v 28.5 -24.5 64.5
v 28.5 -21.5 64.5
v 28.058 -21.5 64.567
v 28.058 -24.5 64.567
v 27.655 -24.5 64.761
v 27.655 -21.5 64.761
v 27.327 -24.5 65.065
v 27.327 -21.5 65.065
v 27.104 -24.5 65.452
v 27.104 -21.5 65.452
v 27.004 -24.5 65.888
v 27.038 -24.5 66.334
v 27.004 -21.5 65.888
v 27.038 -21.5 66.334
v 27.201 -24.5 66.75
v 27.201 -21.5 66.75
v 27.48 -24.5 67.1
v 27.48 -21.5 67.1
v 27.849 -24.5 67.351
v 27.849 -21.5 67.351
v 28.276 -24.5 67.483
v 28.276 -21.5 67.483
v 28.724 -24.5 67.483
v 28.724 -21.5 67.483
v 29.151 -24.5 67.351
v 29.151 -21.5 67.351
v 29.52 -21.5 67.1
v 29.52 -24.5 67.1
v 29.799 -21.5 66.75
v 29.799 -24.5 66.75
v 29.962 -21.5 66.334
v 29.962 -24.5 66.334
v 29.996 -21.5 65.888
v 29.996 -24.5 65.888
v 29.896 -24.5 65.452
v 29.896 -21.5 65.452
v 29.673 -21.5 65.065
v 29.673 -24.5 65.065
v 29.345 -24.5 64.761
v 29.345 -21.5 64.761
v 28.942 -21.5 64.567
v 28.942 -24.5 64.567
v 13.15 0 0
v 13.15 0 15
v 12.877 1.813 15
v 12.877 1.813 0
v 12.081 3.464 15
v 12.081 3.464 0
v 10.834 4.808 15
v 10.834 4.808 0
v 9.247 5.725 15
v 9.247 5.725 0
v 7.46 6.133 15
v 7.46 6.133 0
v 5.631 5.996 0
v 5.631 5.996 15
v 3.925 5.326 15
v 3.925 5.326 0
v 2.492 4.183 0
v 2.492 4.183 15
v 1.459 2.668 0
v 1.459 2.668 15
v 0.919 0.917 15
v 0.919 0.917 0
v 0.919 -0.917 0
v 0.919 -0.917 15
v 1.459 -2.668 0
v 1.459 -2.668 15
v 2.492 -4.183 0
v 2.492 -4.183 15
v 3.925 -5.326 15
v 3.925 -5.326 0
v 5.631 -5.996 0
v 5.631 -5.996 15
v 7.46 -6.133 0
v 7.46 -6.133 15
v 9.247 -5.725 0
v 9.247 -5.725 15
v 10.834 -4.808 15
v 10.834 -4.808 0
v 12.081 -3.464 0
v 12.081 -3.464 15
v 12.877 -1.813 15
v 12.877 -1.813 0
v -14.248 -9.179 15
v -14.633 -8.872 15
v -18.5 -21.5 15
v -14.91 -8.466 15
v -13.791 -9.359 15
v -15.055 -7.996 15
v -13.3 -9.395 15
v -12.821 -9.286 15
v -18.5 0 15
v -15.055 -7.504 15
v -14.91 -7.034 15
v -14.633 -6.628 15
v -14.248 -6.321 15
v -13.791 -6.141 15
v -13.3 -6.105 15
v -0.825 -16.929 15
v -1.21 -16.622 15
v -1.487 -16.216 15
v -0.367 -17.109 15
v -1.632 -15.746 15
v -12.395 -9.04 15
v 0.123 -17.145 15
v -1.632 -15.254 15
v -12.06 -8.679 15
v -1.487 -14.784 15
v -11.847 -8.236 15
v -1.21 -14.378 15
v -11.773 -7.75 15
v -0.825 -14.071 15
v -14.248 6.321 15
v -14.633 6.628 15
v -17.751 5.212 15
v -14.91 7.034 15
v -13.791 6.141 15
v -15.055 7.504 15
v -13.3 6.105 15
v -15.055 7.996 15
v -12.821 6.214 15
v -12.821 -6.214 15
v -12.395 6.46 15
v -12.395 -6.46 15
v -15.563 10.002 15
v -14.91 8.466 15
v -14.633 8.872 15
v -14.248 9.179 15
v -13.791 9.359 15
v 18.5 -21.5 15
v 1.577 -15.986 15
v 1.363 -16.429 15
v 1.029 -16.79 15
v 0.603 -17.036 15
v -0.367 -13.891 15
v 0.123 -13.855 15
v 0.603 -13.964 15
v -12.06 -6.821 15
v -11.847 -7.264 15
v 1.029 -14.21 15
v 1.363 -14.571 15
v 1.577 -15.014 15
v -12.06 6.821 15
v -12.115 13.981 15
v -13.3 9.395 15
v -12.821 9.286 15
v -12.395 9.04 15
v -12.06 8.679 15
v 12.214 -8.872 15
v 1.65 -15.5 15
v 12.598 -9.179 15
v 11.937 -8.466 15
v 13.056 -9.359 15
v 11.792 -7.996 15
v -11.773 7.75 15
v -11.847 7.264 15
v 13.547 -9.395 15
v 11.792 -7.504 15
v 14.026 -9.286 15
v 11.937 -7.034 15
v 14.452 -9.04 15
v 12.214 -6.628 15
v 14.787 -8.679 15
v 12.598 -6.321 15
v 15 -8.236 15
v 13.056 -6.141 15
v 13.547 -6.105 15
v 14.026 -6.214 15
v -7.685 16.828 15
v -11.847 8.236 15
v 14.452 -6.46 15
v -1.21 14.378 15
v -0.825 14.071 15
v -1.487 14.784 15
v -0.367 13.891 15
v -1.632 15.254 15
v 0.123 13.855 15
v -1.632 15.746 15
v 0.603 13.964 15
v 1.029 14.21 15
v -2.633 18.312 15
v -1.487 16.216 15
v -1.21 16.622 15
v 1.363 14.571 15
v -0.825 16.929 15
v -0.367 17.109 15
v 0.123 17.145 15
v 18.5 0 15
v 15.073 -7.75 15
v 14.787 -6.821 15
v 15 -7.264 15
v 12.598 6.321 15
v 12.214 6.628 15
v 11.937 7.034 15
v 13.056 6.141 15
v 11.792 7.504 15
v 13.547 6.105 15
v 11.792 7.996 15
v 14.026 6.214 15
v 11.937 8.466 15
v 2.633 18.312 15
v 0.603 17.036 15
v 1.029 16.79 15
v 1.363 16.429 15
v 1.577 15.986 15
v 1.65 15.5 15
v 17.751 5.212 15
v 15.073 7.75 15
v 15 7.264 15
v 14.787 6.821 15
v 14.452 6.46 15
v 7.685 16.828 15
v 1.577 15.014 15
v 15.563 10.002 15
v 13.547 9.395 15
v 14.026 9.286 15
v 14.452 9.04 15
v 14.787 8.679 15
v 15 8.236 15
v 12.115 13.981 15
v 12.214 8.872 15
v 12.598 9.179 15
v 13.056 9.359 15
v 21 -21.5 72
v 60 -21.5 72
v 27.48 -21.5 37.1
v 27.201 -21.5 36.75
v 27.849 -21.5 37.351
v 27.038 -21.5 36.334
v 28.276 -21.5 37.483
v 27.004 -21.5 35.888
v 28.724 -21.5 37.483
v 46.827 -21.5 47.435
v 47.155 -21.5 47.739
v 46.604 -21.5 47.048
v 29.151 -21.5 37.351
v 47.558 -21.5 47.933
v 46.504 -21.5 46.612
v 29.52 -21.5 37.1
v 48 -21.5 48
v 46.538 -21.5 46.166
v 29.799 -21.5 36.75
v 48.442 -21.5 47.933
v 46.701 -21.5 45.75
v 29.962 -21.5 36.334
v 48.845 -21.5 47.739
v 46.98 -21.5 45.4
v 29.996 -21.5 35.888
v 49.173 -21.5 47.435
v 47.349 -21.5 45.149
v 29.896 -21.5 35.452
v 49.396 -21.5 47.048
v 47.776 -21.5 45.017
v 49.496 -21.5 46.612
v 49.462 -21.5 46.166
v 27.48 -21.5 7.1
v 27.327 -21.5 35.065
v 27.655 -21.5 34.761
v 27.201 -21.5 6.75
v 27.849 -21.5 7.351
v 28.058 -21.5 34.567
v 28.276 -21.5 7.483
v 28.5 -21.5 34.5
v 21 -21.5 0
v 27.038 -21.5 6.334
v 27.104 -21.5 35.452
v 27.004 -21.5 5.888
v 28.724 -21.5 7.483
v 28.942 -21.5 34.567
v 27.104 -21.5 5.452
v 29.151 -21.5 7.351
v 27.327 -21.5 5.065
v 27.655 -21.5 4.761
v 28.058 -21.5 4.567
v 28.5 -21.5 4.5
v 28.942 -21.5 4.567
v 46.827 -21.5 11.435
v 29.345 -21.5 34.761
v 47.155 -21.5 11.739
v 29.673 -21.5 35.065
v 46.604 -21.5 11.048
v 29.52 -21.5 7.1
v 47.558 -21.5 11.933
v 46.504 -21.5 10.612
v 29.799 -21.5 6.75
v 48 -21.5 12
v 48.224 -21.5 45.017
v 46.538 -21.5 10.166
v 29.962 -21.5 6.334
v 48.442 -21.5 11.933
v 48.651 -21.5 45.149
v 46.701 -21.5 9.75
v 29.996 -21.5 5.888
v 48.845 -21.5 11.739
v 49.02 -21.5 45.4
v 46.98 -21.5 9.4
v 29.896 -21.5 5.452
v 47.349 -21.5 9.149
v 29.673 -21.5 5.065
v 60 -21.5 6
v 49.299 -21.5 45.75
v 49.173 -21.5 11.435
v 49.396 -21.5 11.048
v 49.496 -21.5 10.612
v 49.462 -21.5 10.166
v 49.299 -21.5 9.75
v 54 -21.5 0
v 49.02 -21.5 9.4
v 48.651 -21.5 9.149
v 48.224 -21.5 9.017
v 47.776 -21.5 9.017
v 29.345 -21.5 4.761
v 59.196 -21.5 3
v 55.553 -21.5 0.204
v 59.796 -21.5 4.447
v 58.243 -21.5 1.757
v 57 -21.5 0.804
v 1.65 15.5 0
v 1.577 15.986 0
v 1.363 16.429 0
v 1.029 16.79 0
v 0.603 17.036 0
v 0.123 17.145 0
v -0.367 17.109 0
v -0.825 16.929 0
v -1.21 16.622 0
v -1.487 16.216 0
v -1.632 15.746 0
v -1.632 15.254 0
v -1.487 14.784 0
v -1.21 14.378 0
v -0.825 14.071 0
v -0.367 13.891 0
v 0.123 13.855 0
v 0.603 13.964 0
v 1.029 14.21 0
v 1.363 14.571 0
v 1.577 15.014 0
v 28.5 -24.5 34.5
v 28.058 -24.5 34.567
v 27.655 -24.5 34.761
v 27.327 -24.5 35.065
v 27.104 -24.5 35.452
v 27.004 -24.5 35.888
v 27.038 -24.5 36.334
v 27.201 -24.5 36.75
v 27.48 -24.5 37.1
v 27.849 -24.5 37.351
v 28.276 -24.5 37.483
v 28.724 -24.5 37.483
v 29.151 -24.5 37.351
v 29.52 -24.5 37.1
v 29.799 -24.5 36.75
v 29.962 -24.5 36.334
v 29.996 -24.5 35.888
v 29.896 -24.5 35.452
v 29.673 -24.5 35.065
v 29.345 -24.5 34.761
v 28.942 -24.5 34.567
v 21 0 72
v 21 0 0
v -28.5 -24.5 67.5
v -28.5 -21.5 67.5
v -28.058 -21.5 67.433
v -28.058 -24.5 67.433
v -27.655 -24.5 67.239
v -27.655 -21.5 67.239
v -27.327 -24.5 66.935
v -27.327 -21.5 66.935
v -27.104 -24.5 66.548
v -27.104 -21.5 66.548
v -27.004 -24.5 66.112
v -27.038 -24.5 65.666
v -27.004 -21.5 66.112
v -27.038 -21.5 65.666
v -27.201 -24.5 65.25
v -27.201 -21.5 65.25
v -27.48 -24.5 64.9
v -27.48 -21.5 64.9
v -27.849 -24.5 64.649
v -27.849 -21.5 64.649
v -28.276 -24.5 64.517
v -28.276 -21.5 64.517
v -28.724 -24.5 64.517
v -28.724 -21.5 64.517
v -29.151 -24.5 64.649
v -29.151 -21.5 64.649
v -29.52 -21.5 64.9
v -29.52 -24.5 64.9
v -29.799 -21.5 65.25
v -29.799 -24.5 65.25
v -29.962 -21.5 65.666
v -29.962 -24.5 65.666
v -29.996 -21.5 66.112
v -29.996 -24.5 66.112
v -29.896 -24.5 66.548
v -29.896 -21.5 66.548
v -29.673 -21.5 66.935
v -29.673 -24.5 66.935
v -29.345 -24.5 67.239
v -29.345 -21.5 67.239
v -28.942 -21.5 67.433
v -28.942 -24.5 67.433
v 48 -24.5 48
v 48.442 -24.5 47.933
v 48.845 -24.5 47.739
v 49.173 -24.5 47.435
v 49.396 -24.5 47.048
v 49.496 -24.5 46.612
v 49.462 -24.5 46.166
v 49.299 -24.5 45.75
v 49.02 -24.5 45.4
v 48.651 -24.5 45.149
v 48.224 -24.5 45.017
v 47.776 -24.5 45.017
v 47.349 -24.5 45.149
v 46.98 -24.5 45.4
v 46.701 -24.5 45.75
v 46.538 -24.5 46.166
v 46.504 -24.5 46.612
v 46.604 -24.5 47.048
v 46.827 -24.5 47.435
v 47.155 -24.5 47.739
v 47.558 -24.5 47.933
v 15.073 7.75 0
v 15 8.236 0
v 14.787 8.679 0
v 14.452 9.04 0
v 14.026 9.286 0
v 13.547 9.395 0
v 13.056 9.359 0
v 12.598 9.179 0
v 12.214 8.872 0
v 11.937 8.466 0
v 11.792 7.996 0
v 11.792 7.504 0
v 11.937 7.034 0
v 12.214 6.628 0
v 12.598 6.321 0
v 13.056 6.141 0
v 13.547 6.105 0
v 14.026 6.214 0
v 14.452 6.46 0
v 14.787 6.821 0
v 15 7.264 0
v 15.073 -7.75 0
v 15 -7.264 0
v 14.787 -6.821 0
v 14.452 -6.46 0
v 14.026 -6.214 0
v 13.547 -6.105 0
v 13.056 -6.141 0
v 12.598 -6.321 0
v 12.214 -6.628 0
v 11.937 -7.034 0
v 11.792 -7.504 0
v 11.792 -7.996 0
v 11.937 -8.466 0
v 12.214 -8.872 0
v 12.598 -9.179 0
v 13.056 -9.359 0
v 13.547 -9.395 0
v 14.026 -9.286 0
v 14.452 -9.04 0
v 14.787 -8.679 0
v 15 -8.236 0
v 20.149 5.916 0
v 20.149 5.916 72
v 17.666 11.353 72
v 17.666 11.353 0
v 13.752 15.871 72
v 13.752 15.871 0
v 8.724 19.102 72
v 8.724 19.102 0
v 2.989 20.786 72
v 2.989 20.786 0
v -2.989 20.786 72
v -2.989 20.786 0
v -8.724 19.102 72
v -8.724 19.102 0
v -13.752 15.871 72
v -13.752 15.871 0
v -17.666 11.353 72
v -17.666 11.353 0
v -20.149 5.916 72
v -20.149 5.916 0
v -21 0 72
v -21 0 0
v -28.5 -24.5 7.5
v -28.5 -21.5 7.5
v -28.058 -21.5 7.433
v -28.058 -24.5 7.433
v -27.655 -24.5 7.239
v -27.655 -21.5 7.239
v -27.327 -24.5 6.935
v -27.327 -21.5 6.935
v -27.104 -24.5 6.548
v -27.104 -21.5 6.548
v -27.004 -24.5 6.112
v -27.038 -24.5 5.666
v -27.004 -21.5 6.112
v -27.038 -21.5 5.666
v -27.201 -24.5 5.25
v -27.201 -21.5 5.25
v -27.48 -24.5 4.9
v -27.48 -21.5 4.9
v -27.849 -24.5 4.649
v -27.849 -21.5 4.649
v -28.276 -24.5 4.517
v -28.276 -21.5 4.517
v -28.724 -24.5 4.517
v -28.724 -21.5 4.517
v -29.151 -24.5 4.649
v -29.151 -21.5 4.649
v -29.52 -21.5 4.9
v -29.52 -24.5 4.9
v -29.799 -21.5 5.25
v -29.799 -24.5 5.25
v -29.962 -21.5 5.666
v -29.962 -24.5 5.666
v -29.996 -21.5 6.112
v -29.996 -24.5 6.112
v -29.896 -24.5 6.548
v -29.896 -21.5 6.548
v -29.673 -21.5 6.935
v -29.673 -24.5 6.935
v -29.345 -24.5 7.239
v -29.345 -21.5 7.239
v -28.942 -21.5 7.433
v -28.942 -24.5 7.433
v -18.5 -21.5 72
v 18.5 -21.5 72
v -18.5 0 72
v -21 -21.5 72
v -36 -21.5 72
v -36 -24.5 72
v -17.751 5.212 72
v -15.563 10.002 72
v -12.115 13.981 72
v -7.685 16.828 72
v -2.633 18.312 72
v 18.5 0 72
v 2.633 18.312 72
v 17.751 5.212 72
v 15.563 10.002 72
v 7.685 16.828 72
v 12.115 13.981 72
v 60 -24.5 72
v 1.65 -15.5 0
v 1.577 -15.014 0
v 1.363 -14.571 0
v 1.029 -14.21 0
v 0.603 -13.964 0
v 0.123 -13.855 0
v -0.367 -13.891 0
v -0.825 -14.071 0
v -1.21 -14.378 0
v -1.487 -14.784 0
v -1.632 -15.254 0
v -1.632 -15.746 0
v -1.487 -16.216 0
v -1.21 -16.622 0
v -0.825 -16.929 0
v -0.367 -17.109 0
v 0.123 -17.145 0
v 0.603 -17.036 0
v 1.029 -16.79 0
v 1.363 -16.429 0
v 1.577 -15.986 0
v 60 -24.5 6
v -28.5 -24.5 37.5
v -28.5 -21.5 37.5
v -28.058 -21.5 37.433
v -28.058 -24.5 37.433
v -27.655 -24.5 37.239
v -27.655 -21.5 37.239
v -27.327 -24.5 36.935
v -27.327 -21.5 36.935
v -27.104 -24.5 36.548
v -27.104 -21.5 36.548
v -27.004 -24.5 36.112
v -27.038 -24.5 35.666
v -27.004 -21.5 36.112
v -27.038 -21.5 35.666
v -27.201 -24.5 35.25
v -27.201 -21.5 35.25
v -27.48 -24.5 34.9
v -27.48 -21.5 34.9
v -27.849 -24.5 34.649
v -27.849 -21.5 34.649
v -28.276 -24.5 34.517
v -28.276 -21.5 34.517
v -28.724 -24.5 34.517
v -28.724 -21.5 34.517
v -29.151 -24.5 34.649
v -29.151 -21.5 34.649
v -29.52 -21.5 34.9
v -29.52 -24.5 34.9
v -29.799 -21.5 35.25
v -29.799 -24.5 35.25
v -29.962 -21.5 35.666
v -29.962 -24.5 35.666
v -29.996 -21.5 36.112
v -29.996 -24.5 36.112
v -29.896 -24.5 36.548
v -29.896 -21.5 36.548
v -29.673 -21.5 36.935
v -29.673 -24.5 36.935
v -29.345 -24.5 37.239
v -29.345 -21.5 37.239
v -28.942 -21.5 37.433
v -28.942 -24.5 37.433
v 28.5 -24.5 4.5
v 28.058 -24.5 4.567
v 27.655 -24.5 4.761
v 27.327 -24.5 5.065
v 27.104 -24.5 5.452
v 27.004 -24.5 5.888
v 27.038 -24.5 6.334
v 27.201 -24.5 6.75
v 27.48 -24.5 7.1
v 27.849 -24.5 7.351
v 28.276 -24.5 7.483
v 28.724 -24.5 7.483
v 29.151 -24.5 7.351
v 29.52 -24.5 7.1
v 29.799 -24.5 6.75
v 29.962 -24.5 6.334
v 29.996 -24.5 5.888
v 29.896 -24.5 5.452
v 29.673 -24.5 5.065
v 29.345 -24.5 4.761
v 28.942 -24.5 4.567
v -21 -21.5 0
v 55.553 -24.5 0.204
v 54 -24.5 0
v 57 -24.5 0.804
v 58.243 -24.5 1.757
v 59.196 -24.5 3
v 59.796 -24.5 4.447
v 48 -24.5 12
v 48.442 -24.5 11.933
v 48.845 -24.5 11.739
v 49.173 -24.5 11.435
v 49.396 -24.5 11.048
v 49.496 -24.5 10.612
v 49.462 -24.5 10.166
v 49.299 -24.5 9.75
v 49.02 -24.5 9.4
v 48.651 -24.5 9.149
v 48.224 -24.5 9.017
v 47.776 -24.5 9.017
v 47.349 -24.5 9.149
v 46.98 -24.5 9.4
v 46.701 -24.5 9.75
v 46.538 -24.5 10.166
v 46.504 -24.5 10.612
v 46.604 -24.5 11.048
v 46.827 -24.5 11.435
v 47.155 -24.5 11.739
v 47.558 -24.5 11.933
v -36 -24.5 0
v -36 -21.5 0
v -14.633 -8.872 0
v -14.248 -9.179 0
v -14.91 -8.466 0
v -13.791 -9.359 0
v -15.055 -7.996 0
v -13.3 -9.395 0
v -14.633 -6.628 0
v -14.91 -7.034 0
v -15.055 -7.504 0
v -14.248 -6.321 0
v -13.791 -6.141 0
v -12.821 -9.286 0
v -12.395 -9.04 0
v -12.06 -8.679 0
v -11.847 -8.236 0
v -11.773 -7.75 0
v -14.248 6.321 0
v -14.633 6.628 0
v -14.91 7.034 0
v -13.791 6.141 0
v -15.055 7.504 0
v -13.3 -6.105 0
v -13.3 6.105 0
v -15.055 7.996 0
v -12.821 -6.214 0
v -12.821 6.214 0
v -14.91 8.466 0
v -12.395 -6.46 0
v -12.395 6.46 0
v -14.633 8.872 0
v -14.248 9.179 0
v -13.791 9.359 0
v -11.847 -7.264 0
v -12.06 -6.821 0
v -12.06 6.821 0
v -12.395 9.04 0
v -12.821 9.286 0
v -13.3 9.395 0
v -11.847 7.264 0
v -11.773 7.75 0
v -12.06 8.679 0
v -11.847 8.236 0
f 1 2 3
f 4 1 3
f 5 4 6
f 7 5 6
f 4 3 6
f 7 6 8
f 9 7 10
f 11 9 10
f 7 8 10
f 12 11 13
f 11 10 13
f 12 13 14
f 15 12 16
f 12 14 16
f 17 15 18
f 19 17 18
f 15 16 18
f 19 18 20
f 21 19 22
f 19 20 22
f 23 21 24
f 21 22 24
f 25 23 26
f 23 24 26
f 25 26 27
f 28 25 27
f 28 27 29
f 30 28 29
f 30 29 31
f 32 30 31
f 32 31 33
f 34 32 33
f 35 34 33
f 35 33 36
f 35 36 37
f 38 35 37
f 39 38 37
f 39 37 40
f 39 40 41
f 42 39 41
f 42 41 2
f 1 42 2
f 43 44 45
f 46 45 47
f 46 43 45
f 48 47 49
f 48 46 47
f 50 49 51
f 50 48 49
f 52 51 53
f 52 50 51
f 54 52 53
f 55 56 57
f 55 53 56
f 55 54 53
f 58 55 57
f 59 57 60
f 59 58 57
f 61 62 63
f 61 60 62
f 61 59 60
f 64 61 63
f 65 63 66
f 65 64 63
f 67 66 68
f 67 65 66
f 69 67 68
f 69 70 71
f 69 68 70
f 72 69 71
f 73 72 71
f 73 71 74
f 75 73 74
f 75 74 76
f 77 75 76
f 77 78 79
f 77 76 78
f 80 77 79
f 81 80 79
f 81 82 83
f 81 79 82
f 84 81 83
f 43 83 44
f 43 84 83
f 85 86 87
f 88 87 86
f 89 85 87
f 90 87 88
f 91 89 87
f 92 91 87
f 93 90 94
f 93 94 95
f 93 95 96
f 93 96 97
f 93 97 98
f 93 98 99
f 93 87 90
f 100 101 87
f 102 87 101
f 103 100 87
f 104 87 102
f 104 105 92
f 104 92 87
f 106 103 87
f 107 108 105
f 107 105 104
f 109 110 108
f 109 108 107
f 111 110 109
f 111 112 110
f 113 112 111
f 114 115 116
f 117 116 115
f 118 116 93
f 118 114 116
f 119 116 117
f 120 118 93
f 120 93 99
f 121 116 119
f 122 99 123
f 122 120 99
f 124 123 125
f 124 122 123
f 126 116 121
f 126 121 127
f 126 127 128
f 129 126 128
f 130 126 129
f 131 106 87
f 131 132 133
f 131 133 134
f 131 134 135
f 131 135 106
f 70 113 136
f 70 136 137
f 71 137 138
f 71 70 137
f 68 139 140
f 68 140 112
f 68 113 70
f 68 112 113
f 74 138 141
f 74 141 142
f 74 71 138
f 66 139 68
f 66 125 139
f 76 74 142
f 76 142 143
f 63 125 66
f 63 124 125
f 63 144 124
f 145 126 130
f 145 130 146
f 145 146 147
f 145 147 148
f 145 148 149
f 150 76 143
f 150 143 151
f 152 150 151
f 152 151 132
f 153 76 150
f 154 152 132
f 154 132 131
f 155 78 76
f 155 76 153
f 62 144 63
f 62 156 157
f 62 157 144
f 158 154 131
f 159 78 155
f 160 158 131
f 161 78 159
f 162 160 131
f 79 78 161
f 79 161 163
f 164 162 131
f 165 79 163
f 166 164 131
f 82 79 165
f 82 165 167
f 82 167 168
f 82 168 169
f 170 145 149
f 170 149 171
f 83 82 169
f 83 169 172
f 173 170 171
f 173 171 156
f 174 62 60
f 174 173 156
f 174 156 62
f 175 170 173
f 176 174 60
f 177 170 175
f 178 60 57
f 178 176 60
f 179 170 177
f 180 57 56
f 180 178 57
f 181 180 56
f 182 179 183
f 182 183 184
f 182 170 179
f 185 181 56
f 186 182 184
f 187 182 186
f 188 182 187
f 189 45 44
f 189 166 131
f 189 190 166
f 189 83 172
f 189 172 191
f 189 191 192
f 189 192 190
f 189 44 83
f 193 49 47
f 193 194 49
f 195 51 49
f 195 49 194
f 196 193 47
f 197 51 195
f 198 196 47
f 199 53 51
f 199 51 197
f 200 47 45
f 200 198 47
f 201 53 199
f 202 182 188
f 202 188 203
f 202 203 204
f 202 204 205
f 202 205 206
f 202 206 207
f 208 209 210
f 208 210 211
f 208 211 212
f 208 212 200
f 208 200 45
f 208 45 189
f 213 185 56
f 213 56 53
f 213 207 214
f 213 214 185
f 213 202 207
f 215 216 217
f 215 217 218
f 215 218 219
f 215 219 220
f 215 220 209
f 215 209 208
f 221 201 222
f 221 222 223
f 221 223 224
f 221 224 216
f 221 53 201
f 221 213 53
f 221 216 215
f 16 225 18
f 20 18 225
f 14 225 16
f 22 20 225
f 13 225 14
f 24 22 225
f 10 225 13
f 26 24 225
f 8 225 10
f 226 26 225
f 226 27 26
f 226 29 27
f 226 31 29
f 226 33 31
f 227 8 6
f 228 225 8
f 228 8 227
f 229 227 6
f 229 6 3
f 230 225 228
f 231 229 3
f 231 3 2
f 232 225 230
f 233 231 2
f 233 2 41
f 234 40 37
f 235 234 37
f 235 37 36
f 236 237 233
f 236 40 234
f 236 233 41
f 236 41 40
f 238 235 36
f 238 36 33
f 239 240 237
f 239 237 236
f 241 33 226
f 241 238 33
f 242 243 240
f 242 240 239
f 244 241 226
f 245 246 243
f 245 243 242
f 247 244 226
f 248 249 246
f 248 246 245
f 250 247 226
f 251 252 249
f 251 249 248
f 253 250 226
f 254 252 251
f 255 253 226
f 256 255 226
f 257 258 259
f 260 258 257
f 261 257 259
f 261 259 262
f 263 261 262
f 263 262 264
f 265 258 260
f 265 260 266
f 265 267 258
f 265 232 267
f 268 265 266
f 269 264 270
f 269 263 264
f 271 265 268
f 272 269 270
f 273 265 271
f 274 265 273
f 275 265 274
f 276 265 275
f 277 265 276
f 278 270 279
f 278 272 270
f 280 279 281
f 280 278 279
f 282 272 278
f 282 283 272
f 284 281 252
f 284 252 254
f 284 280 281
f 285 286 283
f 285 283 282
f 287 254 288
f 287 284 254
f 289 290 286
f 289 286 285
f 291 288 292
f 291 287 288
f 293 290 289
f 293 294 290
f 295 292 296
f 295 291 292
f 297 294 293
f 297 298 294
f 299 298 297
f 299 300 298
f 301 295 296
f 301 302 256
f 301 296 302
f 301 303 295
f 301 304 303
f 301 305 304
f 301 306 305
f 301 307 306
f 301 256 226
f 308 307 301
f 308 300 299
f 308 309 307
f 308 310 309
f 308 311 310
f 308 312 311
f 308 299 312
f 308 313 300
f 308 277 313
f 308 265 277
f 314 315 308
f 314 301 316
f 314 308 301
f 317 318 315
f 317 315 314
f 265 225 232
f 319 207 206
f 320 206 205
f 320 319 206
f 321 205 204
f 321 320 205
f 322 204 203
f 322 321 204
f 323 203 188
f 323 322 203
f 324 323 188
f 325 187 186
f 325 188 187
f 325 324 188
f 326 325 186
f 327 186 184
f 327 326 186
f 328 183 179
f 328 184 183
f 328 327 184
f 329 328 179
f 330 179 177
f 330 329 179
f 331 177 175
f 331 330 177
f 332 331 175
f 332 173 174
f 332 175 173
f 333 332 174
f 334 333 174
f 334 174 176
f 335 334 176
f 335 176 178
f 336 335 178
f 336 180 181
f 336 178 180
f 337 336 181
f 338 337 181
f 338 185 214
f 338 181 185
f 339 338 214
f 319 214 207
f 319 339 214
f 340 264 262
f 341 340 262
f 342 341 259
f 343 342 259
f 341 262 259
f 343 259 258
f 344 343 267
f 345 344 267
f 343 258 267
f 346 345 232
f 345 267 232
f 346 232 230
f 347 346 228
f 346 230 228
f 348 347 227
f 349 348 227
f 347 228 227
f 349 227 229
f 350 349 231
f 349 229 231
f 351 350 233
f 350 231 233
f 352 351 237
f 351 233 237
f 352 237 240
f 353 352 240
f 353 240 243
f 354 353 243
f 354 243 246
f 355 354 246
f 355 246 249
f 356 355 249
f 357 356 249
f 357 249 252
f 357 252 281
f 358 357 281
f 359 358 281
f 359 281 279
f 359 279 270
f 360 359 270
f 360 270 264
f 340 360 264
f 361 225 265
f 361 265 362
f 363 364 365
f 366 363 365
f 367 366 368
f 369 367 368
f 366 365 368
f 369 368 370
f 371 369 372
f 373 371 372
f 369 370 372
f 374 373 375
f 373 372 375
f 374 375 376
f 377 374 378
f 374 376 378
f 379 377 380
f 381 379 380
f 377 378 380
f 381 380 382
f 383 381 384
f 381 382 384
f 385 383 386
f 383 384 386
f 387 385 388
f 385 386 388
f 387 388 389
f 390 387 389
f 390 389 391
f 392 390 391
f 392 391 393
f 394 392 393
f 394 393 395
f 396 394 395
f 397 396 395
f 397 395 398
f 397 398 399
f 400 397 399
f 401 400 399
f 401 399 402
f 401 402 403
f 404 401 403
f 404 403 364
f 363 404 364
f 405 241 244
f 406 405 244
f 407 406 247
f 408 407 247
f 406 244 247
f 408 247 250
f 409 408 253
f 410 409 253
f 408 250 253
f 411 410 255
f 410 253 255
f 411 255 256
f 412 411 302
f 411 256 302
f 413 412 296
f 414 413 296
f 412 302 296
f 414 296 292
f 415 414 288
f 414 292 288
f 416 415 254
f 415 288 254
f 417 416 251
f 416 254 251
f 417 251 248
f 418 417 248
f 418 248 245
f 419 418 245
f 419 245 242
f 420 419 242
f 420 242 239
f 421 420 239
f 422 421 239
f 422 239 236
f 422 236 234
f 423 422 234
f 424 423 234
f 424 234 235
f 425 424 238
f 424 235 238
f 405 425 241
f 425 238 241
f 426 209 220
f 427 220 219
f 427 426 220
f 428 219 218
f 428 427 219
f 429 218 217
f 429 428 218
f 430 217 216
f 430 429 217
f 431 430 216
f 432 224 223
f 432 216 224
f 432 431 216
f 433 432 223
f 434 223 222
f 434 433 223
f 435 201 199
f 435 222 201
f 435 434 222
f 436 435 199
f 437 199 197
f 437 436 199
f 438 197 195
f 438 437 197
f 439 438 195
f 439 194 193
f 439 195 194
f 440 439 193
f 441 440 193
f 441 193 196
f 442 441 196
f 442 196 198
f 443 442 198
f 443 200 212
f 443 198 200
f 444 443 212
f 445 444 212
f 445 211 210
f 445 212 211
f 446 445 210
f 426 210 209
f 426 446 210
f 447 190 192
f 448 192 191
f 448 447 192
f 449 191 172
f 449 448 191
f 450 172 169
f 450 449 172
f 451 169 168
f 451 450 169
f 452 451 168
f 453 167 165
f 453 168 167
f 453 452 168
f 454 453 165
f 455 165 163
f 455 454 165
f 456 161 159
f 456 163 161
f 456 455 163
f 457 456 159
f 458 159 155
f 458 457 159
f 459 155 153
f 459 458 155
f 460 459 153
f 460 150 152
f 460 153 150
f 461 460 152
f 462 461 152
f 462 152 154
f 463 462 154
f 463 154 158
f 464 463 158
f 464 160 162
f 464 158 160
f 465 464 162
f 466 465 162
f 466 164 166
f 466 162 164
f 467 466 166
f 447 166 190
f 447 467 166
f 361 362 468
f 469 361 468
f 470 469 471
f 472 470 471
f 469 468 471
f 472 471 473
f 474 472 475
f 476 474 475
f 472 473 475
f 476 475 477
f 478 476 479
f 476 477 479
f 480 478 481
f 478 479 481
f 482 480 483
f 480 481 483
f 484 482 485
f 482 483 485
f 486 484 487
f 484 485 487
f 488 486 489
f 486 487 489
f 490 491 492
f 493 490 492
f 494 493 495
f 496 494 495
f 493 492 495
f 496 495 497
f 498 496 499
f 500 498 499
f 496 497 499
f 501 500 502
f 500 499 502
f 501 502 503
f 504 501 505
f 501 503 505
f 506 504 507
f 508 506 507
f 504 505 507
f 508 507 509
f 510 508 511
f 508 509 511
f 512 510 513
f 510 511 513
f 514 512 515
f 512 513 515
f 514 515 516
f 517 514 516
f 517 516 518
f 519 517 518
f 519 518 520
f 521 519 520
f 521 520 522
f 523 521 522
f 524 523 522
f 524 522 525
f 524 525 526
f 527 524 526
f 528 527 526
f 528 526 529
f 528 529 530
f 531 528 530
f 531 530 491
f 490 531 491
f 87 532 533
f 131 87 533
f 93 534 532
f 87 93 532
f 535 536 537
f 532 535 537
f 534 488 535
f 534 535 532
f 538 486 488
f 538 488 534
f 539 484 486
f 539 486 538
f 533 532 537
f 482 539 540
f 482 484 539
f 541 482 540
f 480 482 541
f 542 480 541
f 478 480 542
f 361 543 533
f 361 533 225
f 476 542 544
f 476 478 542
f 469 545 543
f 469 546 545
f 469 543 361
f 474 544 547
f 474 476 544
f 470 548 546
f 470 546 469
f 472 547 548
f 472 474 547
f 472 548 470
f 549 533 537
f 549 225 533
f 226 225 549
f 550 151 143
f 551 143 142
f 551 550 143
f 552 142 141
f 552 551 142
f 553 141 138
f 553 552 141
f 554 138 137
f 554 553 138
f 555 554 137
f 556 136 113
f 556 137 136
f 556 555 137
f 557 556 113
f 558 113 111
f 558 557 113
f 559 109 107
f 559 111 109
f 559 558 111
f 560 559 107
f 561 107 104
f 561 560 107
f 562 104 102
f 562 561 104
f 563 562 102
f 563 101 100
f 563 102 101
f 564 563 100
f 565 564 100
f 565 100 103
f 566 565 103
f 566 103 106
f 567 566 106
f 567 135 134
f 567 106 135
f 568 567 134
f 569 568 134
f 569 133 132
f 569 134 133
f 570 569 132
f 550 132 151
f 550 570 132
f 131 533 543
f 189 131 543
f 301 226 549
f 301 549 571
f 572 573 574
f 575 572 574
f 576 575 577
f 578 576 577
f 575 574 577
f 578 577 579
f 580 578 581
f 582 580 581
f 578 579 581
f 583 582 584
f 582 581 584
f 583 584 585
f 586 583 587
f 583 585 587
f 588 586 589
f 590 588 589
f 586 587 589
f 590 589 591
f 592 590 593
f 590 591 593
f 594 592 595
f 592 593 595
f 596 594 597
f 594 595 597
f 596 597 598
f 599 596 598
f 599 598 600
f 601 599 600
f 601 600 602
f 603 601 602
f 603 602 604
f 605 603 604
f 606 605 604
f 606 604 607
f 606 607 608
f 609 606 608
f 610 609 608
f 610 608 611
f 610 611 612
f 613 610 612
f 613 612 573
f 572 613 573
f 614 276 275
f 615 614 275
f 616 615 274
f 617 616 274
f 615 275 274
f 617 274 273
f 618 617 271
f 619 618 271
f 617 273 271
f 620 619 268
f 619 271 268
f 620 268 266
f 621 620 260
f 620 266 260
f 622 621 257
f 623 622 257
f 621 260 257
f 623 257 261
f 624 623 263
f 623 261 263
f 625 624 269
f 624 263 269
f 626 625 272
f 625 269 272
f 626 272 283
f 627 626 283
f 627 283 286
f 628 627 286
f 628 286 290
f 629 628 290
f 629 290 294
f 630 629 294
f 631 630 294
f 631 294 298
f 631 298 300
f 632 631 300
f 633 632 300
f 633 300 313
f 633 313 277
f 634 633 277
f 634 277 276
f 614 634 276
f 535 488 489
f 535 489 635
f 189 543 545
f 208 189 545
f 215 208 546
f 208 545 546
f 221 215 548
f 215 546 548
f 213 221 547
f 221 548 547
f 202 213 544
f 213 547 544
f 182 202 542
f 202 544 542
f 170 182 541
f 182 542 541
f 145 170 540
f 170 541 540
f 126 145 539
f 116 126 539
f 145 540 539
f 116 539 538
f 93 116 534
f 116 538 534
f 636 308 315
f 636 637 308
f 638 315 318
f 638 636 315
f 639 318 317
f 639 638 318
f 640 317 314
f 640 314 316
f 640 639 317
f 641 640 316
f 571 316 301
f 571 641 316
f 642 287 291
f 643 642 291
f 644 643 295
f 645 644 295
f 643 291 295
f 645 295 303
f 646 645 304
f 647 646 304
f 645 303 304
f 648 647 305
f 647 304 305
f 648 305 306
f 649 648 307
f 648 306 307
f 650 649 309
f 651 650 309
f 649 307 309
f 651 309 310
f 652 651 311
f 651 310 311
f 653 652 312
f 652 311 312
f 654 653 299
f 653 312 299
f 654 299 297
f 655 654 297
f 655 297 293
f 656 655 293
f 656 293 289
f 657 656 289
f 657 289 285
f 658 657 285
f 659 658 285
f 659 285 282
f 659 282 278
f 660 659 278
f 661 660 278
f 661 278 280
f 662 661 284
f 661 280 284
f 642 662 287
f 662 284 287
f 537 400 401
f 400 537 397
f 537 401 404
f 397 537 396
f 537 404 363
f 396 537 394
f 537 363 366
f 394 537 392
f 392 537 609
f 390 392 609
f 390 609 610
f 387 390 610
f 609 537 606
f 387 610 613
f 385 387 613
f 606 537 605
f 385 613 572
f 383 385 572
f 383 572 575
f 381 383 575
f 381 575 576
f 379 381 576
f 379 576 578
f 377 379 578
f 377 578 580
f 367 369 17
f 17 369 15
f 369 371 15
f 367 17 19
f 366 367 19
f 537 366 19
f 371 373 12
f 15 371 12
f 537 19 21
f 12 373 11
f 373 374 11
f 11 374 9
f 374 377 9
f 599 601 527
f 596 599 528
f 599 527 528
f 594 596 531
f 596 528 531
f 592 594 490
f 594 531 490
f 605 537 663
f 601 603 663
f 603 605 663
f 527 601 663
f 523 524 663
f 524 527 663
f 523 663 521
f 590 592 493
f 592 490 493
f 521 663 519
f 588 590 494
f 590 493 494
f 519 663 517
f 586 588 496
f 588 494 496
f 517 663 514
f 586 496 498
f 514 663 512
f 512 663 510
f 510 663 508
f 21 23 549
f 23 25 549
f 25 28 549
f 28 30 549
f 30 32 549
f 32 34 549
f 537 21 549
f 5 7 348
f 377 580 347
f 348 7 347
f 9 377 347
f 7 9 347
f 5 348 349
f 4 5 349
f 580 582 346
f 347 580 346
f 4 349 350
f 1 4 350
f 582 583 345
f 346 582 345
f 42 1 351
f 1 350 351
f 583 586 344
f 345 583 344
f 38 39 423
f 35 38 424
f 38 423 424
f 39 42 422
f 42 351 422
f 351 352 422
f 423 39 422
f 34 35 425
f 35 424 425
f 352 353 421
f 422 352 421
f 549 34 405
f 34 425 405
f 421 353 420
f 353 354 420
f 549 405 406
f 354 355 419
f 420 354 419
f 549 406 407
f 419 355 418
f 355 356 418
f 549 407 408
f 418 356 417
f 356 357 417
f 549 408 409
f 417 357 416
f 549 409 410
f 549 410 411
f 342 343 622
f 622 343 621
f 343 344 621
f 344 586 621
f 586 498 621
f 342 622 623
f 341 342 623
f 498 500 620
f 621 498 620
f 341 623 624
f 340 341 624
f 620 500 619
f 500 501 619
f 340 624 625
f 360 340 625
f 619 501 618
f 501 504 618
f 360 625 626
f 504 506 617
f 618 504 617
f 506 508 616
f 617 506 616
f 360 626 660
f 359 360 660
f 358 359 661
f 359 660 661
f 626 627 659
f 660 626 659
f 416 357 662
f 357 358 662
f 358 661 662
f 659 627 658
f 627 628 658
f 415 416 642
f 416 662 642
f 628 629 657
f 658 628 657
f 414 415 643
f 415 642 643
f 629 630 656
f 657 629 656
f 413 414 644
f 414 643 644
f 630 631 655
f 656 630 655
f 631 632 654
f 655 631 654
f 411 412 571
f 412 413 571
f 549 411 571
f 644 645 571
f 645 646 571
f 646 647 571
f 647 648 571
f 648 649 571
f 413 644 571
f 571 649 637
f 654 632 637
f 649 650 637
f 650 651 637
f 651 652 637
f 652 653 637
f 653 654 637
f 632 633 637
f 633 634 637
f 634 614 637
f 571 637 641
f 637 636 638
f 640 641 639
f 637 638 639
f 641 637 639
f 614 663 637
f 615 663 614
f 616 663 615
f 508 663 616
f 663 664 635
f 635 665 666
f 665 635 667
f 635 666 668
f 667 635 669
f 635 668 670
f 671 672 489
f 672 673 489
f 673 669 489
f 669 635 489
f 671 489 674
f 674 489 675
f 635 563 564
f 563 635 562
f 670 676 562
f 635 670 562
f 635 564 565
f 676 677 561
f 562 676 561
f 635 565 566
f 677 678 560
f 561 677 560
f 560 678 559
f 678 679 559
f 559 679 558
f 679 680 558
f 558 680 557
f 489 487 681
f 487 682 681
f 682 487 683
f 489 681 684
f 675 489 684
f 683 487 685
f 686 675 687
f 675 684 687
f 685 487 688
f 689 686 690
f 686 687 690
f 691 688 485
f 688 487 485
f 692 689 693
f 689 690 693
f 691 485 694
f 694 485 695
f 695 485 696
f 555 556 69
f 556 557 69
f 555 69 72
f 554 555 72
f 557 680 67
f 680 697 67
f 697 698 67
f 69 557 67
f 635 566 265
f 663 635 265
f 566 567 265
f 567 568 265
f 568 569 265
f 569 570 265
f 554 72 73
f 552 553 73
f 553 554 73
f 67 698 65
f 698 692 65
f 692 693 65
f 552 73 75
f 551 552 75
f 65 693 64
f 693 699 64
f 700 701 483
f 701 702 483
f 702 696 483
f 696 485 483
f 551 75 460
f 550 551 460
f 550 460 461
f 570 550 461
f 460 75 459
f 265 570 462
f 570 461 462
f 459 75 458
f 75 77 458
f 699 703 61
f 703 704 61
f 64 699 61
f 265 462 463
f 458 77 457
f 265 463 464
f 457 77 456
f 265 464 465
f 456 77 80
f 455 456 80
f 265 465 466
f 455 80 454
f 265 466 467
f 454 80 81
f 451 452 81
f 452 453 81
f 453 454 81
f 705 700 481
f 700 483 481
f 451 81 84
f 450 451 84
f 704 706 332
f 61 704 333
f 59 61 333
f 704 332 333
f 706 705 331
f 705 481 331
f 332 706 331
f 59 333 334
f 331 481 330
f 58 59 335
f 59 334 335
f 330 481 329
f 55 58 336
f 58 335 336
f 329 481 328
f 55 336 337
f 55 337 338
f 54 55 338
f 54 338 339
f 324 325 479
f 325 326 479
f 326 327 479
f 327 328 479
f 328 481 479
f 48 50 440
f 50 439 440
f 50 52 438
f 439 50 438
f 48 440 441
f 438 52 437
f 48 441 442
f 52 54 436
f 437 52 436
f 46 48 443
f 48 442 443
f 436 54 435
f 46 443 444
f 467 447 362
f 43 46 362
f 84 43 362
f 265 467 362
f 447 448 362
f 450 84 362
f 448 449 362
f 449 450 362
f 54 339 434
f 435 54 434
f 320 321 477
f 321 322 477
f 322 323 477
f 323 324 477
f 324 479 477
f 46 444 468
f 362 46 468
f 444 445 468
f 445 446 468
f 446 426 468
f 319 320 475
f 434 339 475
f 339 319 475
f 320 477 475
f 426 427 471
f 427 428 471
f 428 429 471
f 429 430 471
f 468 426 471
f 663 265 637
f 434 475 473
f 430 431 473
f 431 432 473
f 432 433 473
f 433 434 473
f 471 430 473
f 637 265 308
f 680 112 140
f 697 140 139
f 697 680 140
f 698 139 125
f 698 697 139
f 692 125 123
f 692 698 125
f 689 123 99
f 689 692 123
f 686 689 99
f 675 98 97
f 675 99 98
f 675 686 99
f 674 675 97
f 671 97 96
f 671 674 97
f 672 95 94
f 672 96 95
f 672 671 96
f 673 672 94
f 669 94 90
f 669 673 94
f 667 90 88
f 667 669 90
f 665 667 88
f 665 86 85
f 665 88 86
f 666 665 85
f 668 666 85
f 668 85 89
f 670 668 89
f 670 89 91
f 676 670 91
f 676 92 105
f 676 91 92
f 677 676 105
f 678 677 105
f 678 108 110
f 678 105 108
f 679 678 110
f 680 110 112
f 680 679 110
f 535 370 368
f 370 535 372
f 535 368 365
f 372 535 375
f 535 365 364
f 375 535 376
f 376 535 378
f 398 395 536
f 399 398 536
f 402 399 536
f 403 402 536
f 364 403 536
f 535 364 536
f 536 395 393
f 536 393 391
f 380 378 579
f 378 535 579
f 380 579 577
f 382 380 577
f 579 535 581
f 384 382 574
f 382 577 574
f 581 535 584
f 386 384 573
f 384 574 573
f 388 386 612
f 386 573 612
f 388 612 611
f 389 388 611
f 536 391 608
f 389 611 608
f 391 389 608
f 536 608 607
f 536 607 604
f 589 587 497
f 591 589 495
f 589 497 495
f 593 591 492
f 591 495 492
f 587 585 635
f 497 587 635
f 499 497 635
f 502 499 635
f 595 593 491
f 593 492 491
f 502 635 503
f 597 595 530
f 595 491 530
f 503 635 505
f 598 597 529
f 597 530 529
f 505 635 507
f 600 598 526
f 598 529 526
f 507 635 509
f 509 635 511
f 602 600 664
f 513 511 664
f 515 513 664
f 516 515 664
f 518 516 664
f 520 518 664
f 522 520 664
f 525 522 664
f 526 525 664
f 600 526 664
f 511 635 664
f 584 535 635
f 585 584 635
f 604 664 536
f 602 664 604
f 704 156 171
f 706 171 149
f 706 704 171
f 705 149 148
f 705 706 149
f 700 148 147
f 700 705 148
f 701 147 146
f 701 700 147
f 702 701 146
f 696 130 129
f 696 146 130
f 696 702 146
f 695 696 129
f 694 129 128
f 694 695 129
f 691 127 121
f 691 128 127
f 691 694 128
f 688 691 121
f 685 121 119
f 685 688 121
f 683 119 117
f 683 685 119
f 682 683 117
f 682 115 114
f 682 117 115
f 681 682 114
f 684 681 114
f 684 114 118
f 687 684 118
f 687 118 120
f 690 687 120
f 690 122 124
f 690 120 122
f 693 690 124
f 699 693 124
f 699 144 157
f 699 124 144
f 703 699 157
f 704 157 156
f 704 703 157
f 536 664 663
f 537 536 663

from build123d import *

# Parameters (mm, degrees)
SKETCH1_R           = 1.65
SKETCH1_R_2         = 6.15
BOSS_EXTRUDE1_DEPTH = 72
CUT_EXTRUDE1_DEPTH  = 57
SKETCH3_R           = 1.5
CUT_EXTRUDE2_DEPTH  = 92.028841583
SKETCH4_W           = 24
SKETCH4_H           = 72
SKETCH4_R           = 1.5
BOSS_EXTRUDE2_DEPTH = 3
FILLET1_R           = 6


with BuildPart() as part:
    # Sketch1 → Boss-Extrude1 (new body)
    with BuildSketch(Plane.XY):
        with BuildLine():
            Line((-21, 0), (-21, -21.5))
            Line((-21, -21.5), (-36, -21.5))
            Line((-36, -21.5), (-36, -24.5))
            Line((-36, -24.5), (36, -24.5))
            Line((36, -24.5), (36, -21.5))
            Line((36, -21.5), (21, -21.5))
            Line((21, -21.5), (21, 0))
            ThreePointArc((21, 0), (0, 21), (-21, 0))
        make_face()
        with Locations((0, 15.5)):
            Circle(SKETCH1_R, mode=Mode.SUBTRACT)
        with Locations((13.423393759, 7.75)):
            Circle(SKETCH1_R, mode=Mode.SUBTRACT)
        with Locations((13.423393759, -7.75)):
            Circle(SKETCH1_R, mode=Mode.SUBTRACT)
        with Locations((0, -15.5)):
            Circle(SKETCH1_R, mode=Mode.SUBTRACT)
        with Locations((-13.423393759, -7.75)):
            Circle(SKETCH1_R, mode=Mode.SUBTRACT)
        with Locations((-13.423393759, 7.75)):
            Circle(SKETCH1_R, mode=Mode.SUBTRACT)
        with Locations((7, 0)):
            Circle(SKETCH1_R_2, mode=Mode.SUBTRACT)
    extrude(amount=BOSS_EXTRUDE1_DEPTH)

    # Sketch2 → Cut-Extrude1 (cut)
    with BuildSketch(Plane.XY.offset(72)):
        with BuildLine():
            Line((-18.5, 0), (-18.5, -21.5))
            Line((-18.5, -21.5), (18.5, -21.5))
            Line((18.5, -21.5), (18.5, 0))
            ThreePointArc((18.5, 0), (0, 18.5), (-18.5, 0))
        make_face()
    extrude(amount=-CUT_EXTRUDE1_DEPTH, mode=Mode.SUBTRACT)

    # Sketch3 → Cut-Extrude2 (cut, through all)
    with BuildSketch(Plane(origin=(0, -21.5, 0), x_dir=(1, 0, 0), z_dir=(0, 1, 0))):
        with Locations(Location((-28.5, -36, 0), (0, 0, 270))):
            Circle(SKETCH3_R)
        with Locations(Location((-28.5, -6, 0), (0, 0, 270))):
            Circle(SKETCH3_R)
        with Locations(Location((-28.5, -66, 0), (0, 0, 270))):
            Circle(SKETCH3_R)
        with Locations(Location((28.5, -66, 0), (0, 0, 90))):
            Circle(SKETCH3_R)
        with Locations(Location((28.5, -6, 0), (0, 0, 90))):
            Circle(SKETCH3_R)
        with Locations(Location((28.5, -36, 0), (0, 0, 90))):
            Circle(SKETCH3_R)
    extrude(amount=-CUT_EXTRUDE2_DEPTH, mode=Mode.SUBTRACT)

    # Sketch4 → Boss-Extrude2 (add)
    with BuildSketch(Plane(origin=(0, -21.5, 0), x_dir=(1, 0, 0), z_dir=(0, 1, 0))):
        with Locations((48, -36)):
            Rectangle(SKETCH4_W, SKETCH4_H)
        with Locations(Location((48, -10.5, 0), (0, 0, 270))):
            Circle(SKETCH4_R, mode=Mode.SUBTRACT)
        with Locations(Location((48, -46.5, 0), (0, 0, 270))):
            Circle(SKETCH4_R, mode=Mode.SUBTRACT)
    extrude(amount=-BOSS_EXTRUDE2_DEPTH)

    # Fillet1
    fillet1_edges = [part.edges().sort_by_distance(p)[0] for p in [
        (60, -23, 0),
    ]]
    fillet(fillet1_edges, radius=FILLET1_R)


solid = part.part
